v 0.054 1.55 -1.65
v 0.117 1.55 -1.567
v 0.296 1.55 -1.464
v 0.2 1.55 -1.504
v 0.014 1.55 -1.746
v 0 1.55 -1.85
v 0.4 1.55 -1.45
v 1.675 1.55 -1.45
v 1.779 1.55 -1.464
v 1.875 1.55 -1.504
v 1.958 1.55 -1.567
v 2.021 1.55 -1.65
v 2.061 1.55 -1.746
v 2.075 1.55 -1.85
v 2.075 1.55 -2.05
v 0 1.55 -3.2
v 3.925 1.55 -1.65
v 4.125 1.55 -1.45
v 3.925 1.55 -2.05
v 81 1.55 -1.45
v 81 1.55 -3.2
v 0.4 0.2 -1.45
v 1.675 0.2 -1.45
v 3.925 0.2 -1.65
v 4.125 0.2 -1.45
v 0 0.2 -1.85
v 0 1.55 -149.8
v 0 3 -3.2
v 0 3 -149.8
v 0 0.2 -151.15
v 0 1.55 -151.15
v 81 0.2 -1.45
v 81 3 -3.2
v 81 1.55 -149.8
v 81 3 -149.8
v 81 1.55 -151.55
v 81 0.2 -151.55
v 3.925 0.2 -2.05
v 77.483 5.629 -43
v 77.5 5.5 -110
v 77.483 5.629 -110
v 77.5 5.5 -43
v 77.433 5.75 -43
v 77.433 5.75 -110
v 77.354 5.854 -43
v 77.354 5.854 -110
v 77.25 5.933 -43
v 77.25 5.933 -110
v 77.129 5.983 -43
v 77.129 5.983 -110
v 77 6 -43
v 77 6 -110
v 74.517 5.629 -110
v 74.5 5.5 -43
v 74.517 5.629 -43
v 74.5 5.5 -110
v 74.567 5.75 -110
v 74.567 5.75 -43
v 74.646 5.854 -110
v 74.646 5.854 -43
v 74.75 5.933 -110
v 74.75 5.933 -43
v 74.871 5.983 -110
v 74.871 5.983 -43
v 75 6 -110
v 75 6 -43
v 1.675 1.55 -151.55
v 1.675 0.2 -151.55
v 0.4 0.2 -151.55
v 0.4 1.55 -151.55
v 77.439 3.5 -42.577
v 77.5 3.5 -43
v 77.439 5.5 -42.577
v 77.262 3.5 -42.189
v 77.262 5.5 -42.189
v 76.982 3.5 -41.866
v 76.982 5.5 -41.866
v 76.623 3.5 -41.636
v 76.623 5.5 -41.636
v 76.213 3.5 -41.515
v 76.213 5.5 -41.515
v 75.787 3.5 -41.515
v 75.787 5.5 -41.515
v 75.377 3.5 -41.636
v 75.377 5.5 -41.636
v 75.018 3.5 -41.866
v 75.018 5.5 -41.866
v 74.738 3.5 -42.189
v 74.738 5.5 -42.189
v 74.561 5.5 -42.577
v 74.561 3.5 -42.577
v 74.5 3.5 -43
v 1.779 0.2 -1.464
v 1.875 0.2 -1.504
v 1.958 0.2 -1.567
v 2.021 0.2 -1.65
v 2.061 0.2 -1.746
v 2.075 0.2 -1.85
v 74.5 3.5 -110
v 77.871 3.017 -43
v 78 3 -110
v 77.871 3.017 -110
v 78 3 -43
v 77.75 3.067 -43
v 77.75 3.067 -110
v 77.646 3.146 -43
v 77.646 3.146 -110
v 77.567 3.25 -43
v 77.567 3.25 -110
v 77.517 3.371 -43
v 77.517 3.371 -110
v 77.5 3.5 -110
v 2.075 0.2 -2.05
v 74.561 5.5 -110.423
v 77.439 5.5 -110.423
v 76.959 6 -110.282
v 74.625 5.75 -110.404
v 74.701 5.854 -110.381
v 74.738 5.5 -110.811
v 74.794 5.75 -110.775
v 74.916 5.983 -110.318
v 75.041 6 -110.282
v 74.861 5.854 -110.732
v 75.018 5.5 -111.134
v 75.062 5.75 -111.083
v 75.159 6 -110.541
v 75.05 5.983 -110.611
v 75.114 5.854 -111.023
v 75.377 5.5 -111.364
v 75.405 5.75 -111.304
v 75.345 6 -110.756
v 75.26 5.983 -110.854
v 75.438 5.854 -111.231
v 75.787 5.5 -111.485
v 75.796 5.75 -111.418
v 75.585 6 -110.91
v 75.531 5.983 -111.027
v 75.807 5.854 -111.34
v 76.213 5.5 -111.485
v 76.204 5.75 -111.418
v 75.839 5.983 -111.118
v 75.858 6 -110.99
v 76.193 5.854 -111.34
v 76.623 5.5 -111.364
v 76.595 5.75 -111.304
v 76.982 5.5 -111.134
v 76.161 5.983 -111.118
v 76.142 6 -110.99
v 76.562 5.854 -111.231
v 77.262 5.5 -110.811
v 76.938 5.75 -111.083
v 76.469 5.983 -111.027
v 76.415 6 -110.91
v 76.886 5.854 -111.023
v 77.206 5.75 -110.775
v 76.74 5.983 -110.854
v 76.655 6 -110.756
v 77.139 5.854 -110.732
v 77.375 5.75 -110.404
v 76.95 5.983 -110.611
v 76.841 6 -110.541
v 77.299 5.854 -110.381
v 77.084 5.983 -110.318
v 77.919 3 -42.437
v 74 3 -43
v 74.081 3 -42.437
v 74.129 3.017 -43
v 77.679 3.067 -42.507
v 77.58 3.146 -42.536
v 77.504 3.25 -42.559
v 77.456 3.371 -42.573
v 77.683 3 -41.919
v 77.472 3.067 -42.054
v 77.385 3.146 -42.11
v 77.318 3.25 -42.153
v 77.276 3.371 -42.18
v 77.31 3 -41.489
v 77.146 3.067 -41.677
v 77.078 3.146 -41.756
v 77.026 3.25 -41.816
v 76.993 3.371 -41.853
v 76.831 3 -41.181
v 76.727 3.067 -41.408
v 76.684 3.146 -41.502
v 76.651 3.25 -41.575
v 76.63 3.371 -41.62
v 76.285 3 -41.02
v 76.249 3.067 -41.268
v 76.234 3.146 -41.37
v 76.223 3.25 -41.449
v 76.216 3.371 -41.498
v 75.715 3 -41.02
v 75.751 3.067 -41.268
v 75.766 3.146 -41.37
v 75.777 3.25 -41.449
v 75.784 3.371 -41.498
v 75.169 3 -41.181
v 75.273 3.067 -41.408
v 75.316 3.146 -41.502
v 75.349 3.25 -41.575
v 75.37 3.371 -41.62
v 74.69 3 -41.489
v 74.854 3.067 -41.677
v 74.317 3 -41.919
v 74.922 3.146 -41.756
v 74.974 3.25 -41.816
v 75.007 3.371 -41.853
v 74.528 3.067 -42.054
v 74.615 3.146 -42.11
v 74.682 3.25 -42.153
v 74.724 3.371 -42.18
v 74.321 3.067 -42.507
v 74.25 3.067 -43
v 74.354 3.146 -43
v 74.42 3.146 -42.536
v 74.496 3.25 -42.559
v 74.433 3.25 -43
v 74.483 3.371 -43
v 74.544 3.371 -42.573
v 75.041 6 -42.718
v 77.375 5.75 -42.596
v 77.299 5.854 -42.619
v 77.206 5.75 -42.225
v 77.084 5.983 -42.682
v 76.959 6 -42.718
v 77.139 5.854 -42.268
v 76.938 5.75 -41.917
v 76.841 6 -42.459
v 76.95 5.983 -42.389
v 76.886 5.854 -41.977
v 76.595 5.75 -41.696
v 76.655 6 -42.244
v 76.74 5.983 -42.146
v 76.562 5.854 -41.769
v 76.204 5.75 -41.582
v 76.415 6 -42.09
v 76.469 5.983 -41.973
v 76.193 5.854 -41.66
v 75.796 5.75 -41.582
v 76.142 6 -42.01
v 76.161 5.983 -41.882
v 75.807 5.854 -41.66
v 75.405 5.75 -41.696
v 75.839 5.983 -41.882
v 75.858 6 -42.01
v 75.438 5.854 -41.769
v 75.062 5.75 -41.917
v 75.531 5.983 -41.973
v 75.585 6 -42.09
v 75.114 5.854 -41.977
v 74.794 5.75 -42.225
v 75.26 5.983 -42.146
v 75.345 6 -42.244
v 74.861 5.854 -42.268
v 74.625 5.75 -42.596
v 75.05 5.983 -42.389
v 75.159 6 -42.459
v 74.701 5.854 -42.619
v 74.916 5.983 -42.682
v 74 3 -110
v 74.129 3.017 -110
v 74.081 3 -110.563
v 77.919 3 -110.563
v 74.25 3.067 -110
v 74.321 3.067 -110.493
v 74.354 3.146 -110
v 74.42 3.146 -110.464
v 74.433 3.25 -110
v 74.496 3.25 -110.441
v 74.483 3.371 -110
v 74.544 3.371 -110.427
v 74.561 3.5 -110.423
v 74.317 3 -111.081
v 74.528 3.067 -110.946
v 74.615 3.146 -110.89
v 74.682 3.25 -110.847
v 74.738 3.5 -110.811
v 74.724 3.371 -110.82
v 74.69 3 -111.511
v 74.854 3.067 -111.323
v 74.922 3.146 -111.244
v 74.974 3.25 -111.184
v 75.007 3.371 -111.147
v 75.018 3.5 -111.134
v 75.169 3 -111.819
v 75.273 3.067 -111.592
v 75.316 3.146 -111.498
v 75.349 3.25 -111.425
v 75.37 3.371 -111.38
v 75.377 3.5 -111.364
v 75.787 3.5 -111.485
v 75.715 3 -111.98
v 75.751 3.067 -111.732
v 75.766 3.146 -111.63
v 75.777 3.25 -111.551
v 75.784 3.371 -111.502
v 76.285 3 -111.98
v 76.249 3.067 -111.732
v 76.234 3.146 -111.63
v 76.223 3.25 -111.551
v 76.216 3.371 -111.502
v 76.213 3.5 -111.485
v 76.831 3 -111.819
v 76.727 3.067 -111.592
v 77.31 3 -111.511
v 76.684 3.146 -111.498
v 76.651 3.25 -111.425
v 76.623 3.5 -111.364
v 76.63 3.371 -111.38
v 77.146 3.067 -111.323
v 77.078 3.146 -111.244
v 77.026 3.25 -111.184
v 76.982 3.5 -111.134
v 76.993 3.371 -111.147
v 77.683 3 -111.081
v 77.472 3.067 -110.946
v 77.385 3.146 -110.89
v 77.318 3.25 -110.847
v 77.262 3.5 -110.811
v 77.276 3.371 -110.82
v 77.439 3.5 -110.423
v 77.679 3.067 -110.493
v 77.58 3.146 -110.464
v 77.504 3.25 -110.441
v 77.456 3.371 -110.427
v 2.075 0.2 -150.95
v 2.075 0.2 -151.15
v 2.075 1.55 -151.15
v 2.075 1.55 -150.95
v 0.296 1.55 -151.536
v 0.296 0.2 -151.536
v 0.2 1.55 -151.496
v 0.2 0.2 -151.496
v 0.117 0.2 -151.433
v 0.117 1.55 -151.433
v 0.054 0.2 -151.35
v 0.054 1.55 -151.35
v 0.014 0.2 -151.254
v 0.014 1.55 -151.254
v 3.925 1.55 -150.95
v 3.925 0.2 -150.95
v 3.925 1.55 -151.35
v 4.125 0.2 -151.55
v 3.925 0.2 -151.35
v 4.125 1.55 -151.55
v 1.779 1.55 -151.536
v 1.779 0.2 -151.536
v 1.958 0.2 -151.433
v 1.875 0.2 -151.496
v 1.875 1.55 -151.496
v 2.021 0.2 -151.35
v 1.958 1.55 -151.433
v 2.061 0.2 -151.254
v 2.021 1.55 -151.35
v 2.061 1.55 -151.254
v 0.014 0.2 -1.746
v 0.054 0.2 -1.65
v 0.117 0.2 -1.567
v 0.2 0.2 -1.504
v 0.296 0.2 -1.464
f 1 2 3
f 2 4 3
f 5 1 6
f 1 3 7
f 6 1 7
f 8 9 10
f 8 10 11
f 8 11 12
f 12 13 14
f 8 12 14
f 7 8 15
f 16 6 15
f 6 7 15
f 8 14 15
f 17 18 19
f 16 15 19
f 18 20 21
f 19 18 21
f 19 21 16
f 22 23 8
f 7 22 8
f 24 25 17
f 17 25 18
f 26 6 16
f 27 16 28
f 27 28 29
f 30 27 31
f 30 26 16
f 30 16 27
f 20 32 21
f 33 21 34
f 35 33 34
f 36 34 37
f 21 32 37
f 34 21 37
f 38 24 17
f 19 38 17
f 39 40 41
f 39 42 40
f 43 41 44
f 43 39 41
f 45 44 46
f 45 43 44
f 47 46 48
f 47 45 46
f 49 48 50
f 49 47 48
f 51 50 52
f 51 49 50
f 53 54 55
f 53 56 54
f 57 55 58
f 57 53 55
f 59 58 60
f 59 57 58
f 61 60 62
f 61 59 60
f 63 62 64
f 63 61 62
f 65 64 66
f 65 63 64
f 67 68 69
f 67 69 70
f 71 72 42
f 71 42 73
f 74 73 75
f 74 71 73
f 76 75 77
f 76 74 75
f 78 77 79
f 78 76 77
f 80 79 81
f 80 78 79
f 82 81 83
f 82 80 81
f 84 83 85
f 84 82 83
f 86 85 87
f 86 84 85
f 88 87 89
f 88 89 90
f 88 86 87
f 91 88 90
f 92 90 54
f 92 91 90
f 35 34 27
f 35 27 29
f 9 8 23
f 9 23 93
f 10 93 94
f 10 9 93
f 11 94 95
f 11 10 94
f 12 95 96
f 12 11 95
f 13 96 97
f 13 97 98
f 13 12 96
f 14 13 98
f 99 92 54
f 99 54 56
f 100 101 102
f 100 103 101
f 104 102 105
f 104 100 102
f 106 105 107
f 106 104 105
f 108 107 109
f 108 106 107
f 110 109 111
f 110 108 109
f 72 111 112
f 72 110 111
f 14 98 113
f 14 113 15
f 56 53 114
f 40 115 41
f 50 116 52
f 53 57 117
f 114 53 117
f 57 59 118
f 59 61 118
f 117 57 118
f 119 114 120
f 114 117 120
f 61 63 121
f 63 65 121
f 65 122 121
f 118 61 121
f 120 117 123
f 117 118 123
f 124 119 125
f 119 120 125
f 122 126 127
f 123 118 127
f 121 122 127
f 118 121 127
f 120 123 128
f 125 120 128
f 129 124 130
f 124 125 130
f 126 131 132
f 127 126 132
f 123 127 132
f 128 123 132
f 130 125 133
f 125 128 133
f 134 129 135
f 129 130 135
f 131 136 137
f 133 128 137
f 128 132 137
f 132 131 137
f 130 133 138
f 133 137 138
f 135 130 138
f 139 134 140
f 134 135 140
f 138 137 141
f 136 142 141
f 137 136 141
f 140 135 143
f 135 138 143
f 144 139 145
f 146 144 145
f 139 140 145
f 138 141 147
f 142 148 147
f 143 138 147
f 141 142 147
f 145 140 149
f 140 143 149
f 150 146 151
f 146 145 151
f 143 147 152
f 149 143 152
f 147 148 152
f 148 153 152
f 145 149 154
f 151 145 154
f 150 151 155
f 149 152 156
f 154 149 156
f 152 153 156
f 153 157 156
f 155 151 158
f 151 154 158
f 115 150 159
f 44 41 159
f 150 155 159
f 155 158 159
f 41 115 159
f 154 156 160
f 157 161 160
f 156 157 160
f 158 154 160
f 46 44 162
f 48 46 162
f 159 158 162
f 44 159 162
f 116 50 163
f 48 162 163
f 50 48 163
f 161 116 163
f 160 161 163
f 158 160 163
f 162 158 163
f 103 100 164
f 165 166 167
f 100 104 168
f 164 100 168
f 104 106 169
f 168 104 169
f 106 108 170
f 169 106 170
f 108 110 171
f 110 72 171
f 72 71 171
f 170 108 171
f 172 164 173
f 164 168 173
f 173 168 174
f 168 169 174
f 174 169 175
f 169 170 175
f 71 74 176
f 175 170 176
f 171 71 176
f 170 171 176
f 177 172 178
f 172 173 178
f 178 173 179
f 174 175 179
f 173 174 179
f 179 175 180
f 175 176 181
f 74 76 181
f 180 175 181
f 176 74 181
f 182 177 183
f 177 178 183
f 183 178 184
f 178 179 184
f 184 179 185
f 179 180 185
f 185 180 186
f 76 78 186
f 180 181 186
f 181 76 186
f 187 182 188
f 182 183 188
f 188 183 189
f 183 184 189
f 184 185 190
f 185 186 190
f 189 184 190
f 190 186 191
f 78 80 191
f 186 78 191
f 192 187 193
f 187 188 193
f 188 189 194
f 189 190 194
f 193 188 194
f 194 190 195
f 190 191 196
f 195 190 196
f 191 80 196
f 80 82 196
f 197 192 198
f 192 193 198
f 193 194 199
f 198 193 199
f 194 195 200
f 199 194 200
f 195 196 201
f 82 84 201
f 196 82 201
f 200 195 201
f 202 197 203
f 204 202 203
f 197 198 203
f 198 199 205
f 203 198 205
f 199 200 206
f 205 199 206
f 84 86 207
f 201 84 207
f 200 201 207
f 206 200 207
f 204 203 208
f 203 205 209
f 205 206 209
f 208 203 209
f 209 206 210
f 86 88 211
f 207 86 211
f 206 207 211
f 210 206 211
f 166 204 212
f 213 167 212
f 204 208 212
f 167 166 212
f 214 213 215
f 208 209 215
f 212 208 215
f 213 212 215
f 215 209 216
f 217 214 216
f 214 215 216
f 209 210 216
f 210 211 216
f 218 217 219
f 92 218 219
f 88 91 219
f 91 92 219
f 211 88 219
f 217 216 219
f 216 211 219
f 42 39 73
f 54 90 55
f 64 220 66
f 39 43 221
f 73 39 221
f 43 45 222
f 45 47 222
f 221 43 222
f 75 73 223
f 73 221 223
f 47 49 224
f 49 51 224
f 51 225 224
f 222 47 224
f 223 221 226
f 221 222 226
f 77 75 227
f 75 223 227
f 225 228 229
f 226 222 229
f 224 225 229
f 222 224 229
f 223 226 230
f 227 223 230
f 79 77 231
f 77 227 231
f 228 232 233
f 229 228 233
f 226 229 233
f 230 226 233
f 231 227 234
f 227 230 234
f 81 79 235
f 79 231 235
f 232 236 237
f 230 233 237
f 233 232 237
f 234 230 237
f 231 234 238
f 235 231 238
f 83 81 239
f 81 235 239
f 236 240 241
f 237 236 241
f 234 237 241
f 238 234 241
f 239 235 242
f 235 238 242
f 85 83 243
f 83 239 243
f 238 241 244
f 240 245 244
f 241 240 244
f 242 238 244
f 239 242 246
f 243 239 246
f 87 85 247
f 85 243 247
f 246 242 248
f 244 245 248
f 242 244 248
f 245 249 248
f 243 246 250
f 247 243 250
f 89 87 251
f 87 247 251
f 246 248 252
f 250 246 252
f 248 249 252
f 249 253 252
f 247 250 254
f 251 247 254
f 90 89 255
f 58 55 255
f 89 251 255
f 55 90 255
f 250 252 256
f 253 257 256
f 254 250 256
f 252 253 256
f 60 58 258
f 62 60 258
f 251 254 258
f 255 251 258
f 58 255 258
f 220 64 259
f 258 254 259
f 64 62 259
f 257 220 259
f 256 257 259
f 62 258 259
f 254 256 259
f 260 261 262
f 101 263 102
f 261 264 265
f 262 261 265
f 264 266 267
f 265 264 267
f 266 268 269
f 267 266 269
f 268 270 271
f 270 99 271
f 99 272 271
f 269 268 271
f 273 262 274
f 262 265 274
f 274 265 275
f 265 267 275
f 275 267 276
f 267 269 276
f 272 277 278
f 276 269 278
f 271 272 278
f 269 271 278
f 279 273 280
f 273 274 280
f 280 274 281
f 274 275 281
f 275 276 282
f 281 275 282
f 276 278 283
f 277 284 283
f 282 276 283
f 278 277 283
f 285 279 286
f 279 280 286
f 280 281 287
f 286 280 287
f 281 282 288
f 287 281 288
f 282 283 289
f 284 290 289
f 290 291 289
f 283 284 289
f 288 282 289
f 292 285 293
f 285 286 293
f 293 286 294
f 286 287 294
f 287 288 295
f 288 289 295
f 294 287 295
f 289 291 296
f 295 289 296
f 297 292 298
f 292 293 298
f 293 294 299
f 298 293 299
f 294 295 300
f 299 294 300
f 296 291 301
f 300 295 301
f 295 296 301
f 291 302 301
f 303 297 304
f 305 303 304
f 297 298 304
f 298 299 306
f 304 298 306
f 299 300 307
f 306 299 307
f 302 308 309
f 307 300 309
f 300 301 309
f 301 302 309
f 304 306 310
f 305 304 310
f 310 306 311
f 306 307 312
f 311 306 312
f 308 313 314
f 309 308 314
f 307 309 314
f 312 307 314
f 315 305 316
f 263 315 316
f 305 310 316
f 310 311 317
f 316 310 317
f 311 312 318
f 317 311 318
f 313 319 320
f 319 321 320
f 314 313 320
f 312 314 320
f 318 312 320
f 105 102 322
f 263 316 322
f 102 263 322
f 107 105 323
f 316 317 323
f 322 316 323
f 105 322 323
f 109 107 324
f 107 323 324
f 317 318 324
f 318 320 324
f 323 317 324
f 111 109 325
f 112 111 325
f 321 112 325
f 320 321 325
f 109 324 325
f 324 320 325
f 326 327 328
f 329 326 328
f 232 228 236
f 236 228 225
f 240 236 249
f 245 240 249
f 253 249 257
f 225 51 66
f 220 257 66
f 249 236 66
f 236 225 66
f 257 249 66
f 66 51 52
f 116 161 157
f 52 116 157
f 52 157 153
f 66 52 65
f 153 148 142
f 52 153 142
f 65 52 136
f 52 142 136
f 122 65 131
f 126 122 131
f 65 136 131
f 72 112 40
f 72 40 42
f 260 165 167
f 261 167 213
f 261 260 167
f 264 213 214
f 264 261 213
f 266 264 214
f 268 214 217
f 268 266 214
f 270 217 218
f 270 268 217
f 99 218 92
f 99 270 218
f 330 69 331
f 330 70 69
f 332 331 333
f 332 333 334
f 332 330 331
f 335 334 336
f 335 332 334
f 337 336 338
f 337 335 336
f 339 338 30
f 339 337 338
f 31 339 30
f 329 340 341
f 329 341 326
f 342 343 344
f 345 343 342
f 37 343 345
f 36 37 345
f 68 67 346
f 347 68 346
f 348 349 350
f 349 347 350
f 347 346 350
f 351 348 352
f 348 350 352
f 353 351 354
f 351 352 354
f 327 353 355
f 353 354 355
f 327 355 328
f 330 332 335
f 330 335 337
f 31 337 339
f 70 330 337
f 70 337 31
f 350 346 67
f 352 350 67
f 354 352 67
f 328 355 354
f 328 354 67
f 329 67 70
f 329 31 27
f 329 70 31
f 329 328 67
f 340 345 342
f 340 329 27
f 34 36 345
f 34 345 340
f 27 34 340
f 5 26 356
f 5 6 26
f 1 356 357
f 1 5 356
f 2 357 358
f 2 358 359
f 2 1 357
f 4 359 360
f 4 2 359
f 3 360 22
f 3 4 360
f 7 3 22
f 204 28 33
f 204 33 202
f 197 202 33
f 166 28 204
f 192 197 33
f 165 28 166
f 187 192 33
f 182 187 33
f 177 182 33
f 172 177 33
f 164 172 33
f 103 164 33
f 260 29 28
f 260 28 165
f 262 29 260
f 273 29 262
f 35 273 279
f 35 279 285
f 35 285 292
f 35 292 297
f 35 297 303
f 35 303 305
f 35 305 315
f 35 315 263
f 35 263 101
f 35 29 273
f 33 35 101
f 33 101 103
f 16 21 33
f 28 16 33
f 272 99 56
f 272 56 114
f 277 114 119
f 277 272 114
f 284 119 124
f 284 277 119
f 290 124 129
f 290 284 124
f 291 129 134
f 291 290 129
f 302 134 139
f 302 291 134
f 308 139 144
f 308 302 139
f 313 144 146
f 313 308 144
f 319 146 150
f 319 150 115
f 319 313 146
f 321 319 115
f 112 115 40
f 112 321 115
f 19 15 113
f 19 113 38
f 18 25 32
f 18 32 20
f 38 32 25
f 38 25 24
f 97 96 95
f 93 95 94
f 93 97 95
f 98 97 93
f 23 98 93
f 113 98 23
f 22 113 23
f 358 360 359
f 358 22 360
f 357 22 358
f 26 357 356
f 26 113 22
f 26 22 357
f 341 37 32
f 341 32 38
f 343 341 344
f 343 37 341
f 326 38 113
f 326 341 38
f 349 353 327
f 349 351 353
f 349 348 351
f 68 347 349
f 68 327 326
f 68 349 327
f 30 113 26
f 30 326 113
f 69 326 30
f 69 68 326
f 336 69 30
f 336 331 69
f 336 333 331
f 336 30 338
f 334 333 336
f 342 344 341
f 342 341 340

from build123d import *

# Parameters (mm, degrees)
SKETCH1_W           = 81
SKETCH1_H           = 153
BOSS_EXTRUDE1_DEPTH = 3
CUT_EXTRUDE2_DEPTH  = 81
CUT_EXTRUDE3_DEPTH  = 81
SKETCH6_W           = 1.85
SKETCH6_H           = 1.55
CUT_EXTRUDE5_DEPTH  = 0.6
FILLET6_R           = 0.4
CHAMFER2_SIZE       = 0.2
SKETCH7_W           = 1.85
SKETCH7_H           = 1.55
CUT_EXTRUDE6_DEPTH  = 0.6
FILLET7_R           = 0.4
CHAMFER3_SIZE       = 0.2
SKETCH10_W          = 81
SKETCH10_H          = 150.1
CUT_EXTRUDE7_DEPTH  = 0.2
FILLET8_R           = 0.4
BOSS_EXTRUDE2_DEPTH = 3
FILLET10_R          = 0.5


with BuildPart() as part:
    # Sketch1 → Boss-Extrude1 (new body)
    with BuildSketch(Plane(origin=(0, 0, 0), x_dir=(1, 0, 0), z_dir=(0, 1, 0))):
        with Locations((40.5, 76.5)):
            Rectangle(SKETCH1_W, SKETCH1_H)
    extrude(amount=BOSS_EXTRUDE1_DEPTH)

    # Sketch2 → Cut-Extrude2 (cut)
    with BuildSketch(Plane(origin=(81, 0, 0), x_dir=(0, 0, -1), z_dir=(1, 0, 0))):
        Polygon((0, 3), (3, 3), (3, 1.75), (1.25, 1.75), (1.25, 0), (0, 0), align=None)
        Polygon((151.75, 0), (153, 0), (153, 3), (150, 3), (150, 1.75), (151.75, 1.75), align=None)
    extrude(amount=-CUT_EXTRUDE2_DEPTH, mode=Mode.SUBTRACT)

    # Sketch4 → Cut-Extrude3 (cut)
    with BuildSketch(Plane(origin=(81, 0, 0), x_dir=(0, 0, -1), z_dir=(1, 0, 0))):
        Polygon((3.2, 3), (3, 3), (3, 1.75), (1.25, 1.75), (1.25, 0), (1.45, 0), (1.45, 1.55), (3.2, 1.55), align=None)
        Polygon((151.75, 0), (151.55, 0), (151.55, 1.55), (149.8, 1.55), (149.8, 3), (150, 3), (150, 1.75), (151.75, 1.75), align=None)
    extrude(amount=-CUT_EXTRUDE3_DEPTH, mode=Mode.SUBTRACT)

    # Sketch6 → Cut-Extrude5 (cut)
    with BuildSketch(Plane.XY.offset(-1.45)):
        with Locations((3, 0.775)):
            Rectangle(SKETCH6_W, SKETCH6_H)
    extrude(amount=-CUT_EXTRUDE5_DEPTH, mode=Mode.SUBTRACT)

    # Fillet6
    fillet6_edges = [part.edges().sort_by_distance(p)[0] for p in [
        (2.075, 0.775, -1.45),
    ]]
    fillet(fillet6_edges, radius=FILLET6_R)

    # Chamfer2
    chamfer2_edges = [part.edges().sort_by_distance(p)[0] for p in [
        (3.925, 0.775, -1.45),
    ]]
    chamfer(chamfer2_edges, length=CHAMFER2_SIZE)

    # Sketch7 → Cut-Extrude6 (cut)
    with BuildSketch(Plane(origin=(0, 0, -151.55), x_dir=(-1, 0, 0), z_dir=(0, 0, -1))):
        with Locations((-3, 0.775)):
            Rectangle(SKETCH7_W, SKETCH7_H)
    extrude(amount=-CUT_EXTRUDE6_DEPTH, mode=Mode.SUBTRACT)

    # Fillet7
    fillet7_edges = [part.edges().sort_by_distance(p)[0] for p in [
        (2.075, 0.775, -151.55),
    ]]
    fillet(fillet7_edges, radius=FILLET7_R)

    # Chamfer3
    chamfer3_edges = [part.edges().sort_by_distance(p)[0] for p in [
        (3.925, 0.775, -151.55),
    ]]
    chamfer(chamfer3_edges, length=CHAMFER3_SIZE)

    # Sketch10 → Cut-Extrude7 (cut)
    with BuildSketch(Plane(origin=(0, 0, 0), x_dir=(-1, 0, 0), z_dir=(0, -1, 0))):
        with Locations((-40.5, 76.5)):
            Rectangle(SKETCH10_W, SKETCH10_H)
    extrude(amount=-CUT_EXTRUDE7_DEPTH, mode=Mode.SUBTRACT)

    # Fillet8
    fillet8_edges = [part.edges().sort_by_distance(p)[0] for p in [
        (0, 0.875, -151.55),
        (0, 0.875, -1.45),
    ]]
    fillet(fillet8_edges, radius=FILLET8_R)

    # Sketch9 → Boss-Extrude2 (add)
    with BuildSketch(Plane(origin=(0, 3, 0), x_dir=(1, 0, 0), z_dir=(0, 1, 0))):
        with BuildLine():
            Line((74.5, 43), (74.5, 110))
            ThreePointArc((74.5, 110), (76, 111.5), (77.5, 110))
            Line((77.5, 110), (77.5, 43))
            ThreePointArc((77.5, 43), (76, 41.5), (74.5, 43))
        make_face()
    extrude(amount=BOSS_EXTRUDE2_DEPTH)

    # Fillet10
    fillet10_edges = [part.edges().sort_by_distance(p)[0] for p in [
        (76, 3, -41.5),
        (77.5, 3, -76.5),
        (76, 3, -111.5),
        (74.5, 3, -76.5),
        (76, 6, -41.5),
        (77.5, 6, -76.5),
        (76, 6, -111.5),
        (74.5, 6, -76.5),
    ]]
    fillet(fillet10_edges, radius=FILLET10_R)


solid = part.part
